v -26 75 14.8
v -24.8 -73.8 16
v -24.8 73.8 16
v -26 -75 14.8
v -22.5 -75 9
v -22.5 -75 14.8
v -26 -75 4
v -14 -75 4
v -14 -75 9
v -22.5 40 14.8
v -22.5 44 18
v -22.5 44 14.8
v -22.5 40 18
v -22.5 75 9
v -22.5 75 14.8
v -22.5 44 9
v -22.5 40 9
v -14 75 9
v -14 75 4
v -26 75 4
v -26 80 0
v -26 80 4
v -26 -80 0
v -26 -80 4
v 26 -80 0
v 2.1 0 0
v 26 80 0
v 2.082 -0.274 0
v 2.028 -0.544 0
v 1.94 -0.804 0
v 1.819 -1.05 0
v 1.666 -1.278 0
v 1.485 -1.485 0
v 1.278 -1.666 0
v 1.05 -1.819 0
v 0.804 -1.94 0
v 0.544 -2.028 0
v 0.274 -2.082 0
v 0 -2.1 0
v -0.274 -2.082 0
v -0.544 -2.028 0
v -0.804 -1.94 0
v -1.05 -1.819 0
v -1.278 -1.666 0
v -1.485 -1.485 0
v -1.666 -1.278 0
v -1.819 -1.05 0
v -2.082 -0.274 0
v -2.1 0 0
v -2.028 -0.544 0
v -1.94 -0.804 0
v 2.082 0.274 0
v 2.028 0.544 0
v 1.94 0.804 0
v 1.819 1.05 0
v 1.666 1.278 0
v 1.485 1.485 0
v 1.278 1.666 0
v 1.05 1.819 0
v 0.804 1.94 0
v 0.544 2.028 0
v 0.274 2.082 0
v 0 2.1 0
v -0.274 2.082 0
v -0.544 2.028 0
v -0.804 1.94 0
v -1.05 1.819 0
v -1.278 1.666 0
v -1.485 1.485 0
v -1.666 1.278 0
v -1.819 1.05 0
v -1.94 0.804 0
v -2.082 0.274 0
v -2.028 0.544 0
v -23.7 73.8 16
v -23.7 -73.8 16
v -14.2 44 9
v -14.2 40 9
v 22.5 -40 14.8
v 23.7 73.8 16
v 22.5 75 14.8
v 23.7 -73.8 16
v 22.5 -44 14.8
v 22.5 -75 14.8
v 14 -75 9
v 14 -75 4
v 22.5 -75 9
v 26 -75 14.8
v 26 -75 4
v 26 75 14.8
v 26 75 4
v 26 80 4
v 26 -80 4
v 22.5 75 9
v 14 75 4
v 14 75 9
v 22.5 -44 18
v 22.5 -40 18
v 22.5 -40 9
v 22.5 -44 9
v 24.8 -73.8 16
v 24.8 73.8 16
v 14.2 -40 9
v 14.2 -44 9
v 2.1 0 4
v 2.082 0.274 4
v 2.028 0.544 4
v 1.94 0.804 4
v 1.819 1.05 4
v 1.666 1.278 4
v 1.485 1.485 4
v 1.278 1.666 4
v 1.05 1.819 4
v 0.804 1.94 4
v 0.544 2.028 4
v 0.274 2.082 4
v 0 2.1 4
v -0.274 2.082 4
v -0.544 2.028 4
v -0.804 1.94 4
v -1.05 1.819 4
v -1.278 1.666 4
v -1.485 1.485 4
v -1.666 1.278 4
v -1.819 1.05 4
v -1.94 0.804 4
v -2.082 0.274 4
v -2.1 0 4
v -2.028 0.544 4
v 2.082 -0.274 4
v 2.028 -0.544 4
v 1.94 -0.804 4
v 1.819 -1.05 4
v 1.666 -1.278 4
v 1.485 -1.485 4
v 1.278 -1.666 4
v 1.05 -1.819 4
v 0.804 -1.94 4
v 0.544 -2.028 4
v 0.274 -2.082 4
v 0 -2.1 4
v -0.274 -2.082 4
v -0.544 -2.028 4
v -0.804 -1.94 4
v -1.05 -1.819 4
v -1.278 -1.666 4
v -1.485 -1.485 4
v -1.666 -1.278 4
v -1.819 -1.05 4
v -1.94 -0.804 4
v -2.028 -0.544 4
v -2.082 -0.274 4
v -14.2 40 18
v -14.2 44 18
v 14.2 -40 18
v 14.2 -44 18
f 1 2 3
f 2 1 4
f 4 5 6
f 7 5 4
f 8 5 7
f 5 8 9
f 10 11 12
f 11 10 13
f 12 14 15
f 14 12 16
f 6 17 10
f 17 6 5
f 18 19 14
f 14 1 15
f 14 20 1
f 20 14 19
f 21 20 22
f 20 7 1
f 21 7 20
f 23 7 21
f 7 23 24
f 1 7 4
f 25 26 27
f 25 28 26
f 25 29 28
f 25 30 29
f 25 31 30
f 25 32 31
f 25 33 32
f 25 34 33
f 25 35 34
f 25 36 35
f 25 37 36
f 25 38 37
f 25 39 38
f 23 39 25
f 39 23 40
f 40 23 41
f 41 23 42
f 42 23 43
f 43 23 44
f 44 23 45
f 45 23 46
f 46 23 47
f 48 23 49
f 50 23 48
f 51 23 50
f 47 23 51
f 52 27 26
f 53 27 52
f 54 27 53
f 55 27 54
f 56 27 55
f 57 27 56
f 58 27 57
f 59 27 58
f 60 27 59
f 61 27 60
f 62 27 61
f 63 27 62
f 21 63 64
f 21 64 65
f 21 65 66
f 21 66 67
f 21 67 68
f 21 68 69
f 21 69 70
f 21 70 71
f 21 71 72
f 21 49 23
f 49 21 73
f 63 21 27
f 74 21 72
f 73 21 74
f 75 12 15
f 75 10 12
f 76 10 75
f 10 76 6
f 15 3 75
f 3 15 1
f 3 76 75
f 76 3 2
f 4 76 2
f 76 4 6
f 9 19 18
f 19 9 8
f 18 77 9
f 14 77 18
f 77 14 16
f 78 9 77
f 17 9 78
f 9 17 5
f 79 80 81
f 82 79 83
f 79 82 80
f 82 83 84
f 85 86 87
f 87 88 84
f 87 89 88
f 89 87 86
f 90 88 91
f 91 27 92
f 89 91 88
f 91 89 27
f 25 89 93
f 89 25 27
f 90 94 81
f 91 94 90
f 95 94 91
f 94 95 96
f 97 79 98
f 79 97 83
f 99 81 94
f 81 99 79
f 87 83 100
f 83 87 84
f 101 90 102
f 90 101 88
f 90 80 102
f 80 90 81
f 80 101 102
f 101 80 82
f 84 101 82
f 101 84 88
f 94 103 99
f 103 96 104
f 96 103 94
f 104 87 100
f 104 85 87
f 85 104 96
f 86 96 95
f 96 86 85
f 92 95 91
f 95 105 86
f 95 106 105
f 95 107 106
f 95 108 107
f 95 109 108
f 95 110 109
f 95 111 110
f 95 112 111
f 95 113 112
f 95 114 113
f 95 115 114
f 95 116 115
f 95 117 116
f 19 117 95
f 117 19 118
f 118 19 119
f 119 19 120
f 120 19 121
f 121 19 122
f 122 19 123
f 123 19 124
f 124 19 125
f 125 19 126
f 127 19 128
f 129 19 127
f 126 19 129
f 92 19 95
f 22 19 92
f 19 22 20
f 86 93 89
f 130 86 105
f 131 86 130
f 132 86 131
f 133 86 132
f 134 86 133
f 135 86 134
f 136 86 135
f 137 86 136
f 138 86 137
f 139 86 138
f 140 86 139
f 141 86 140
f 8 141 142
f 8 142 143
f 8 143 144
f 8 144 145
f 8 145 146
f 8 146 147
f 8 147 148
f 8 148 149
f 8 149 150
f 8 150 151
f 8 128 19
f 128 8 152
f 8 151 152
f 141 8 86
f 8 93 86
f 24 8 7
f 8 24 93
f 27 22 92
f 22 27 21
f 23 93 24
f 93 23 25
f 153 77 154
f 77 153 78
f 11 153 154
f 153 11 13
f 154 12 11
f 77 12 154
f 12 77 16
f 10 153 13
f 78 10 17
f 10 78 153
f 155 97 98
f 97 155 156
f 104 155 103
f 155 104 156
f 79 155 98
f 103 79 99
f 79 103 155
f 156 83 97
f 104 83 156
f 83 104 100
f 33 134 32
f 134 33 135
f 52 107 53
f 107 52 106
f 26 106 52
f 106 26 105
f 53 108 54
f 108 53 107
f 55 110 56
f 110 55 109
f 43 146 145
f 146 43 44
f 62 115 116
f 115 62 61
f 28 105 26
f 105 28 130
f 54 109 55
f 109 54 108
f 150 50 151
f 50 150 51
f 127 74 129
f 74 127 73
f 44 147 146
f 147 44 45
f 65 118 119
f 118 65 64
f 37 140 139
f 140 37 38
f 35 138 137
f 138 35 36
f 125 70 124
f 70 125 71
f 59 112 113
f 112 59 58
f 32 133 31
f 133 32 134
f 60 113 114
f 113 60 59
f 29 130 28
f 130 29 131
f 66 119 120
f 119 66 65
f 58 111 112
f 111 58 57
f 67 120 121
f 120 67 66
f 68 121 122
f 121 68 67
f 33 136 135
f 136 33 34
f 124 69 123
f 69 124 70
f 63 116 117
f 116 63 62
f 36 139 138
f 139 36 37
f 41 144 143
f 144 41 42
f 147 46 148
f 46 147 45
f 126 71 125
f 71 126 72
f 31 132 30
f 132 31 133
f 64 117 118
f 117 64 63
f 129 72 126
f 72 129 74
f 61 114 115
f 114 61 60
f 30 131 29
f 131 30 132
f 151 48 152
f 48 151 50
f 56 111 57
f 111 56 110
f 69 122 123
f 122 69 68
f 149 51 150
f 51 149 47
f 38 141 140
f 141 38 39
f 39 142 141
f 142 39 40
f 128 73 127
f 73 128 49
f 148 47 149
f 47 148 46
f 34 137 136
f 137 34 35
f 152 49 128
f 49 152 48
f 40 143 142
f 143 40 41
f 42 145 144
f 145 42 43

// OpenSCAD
// Rack-and-pinion parallel gripper for the task (all sizes in mm, matching task.py).
// Export each part:  openscad -o housing.stl -D 'part="housing"' gripper.scad   (also "rack_near", "rack_far", "pinion")
// Print: PETG, 0.2 mm layers, 4 perimeters, 40 % gyroid infill, no supports (racks print lying on their side face).
// Hardware: 8 x dowel pin ISO 8734 / DIN 6325 m6, 3 x 16 mm, hardened (Zoro Select M390800300016); 1 x shoulder screw ISO 7379, 5 mm shoulder x 16 mm, M4 thread (McMaster-Carr 92981A series); 1 x steel flat
// bar 160 x 50 x 6 mm glued under the housing (brings the housing to about 460 g).
part = "housing";

R = 12;            // pinion pitch radius: pins on a 24 mm circle
P = 2 * PI * R / 8; // 9.42 mm circular pitch (module 3)
GAP = 3.4;         // tooth gap round a 3 mm pin: 0.4 mm backlash per rack
TW = P - GAP;      // tooth width
T_IN = R - 1.0;    // tooth crest, 1 mm inside the pitch line
T_OUT = R + 1.8;   // tooth root (rack body face)
BODY_W = 8; RL = 88; RH = 12;
CLOSED_C = 4;      // closed rack's middle, 4 mm from the axis along the rack
HL = 160; HW = 52; FLOOR = 4; WALL_IN = 22.5; WALL_T = 3.5; WALL_H = 12; RAIL_H = 5;
DISC_D = 27.2; DISC_T = 4;
$fn = 48;

module chamfered_box(size, c) {  // a box with its top edges chamfered by c
    hull() {
        translate([0, 0, 0]) cube([size[0], size[1], size[2] - c]);
        translate([c, c, 0]) cube([size[0] - 2 * c, size[1] - 2 * c, size[2]]);
    }
}

module rack(side) {  // side = +1 far (orange), -1 near (white); origin on the pitch line, rack middle, underside
    g0 = -side * CLOSED_C;
    mirror([side < 0 ? 1 : 0, 0, 0]) {
        translate([T_OUT - R, -RL / 2, 0]) cube([BODY_W, RL, RH]);                      // body
        for (k = [-6 : 6]) {
            yc = g0 + (k + 0.5) * P;
            if (abs(yc) <= RL / 2 - TW / 2)
                hull() {                                                                 // tooth with a rounded crest
                    translate([T_IN + 0.6 - R, yc - TW / 2, 1.5]) cube([T_OUT - T_IN - 0.6, TW, RH - 1.5]);
                    translate([T_IN - R, yc - TW / 2 + 0.6, 1.5]) cube([0.6, TW - 1.2, RH - 1.5]);
                    translate([T_IN - R, yc - TW / 2 + 0.8, 0]) cube([T_OUT - T_IN, TW - 1.6, 1.5]); // lead-in foot
                }
        }
        translate([T_OUT - R + BODY_W / 2 - 3.75, RL / 2, 0]) cube([7.5, 6, 30]);           // finger plate
        difference() {                                                                   // finger-mount boss
            translate([T_OUT - R + BODY_W / 2 - 3.5, -3, RH]) cube([7, 6, 19.5]);
            translate([T_OUT - R + BODY_W / 2, -4, RH + 12]) rotate([-90, 0, 0]) cylinder(d = 2.5, h = 8); // M3 tap hole
        }
    }
}

module housing() {
    difference() {
        union() {
            translate([-HW / 2, -HL / 2, 0]) cube([HW, HL, FLOOR]);
            for (s = [-1, 1]) {
                translate([s > 0 ? WALL_IN : -WALL_IN - WALL_T, -HL / 2 + 5, 0]) chamfered_box([WALL_T, HL - 10, FLOOR + WALL_H], 1.2);
                translate([s > 0 ? T_OUT + 0.2 : -WALL_IN, -HL / 2 + 5, 0]) cube([WALL_IN - T_OUT - 0.2, HL - 10, FLOOR + RAIL_H]);
            }
            translate([-WALL_IN, RL / 2 - CLOSED_C, 0]) cube([WALL_IN - T_OUT - 0.4, 4, FLOOR + RAIL_H + 9]);       // near stop
            translate([T_OUT + 0.4, -(RL / 2 - CLOSED_C) - 4, 0]) cube([WALL_IN - T_OUT - 0.4, 4, FLOOR + RAIL_H + 9]); // far stop
        }
        translate([0, 0, -1]) cylinder(d = 4.2, h = FLOOR + 2);   // M4 thread clearance (tapped into the steel bar below)
    }
}

module pinion() {
    difference() {
        union() {
            cylinder(d = DISC_D, h = DISC_T);
            cylinder(d = 10, h = 14);
        }
        translate([0, 0, -1]) cylinder(d = 5.1, h = 16);                                // shoulder screw bore
        for (k = [0 : 7]) rotate([0, 0, k * 45]) translate([R, 0, 0.5]) cylinder(d = 2.95, h = DISC_T); // press fit, 3.5 mm deep
    }
}

if (part == "housing") housing();
if (part == "rack_near") rack(-1);
if (part == "rack_far") rack(1);
if (part == "pinion") pinion();
